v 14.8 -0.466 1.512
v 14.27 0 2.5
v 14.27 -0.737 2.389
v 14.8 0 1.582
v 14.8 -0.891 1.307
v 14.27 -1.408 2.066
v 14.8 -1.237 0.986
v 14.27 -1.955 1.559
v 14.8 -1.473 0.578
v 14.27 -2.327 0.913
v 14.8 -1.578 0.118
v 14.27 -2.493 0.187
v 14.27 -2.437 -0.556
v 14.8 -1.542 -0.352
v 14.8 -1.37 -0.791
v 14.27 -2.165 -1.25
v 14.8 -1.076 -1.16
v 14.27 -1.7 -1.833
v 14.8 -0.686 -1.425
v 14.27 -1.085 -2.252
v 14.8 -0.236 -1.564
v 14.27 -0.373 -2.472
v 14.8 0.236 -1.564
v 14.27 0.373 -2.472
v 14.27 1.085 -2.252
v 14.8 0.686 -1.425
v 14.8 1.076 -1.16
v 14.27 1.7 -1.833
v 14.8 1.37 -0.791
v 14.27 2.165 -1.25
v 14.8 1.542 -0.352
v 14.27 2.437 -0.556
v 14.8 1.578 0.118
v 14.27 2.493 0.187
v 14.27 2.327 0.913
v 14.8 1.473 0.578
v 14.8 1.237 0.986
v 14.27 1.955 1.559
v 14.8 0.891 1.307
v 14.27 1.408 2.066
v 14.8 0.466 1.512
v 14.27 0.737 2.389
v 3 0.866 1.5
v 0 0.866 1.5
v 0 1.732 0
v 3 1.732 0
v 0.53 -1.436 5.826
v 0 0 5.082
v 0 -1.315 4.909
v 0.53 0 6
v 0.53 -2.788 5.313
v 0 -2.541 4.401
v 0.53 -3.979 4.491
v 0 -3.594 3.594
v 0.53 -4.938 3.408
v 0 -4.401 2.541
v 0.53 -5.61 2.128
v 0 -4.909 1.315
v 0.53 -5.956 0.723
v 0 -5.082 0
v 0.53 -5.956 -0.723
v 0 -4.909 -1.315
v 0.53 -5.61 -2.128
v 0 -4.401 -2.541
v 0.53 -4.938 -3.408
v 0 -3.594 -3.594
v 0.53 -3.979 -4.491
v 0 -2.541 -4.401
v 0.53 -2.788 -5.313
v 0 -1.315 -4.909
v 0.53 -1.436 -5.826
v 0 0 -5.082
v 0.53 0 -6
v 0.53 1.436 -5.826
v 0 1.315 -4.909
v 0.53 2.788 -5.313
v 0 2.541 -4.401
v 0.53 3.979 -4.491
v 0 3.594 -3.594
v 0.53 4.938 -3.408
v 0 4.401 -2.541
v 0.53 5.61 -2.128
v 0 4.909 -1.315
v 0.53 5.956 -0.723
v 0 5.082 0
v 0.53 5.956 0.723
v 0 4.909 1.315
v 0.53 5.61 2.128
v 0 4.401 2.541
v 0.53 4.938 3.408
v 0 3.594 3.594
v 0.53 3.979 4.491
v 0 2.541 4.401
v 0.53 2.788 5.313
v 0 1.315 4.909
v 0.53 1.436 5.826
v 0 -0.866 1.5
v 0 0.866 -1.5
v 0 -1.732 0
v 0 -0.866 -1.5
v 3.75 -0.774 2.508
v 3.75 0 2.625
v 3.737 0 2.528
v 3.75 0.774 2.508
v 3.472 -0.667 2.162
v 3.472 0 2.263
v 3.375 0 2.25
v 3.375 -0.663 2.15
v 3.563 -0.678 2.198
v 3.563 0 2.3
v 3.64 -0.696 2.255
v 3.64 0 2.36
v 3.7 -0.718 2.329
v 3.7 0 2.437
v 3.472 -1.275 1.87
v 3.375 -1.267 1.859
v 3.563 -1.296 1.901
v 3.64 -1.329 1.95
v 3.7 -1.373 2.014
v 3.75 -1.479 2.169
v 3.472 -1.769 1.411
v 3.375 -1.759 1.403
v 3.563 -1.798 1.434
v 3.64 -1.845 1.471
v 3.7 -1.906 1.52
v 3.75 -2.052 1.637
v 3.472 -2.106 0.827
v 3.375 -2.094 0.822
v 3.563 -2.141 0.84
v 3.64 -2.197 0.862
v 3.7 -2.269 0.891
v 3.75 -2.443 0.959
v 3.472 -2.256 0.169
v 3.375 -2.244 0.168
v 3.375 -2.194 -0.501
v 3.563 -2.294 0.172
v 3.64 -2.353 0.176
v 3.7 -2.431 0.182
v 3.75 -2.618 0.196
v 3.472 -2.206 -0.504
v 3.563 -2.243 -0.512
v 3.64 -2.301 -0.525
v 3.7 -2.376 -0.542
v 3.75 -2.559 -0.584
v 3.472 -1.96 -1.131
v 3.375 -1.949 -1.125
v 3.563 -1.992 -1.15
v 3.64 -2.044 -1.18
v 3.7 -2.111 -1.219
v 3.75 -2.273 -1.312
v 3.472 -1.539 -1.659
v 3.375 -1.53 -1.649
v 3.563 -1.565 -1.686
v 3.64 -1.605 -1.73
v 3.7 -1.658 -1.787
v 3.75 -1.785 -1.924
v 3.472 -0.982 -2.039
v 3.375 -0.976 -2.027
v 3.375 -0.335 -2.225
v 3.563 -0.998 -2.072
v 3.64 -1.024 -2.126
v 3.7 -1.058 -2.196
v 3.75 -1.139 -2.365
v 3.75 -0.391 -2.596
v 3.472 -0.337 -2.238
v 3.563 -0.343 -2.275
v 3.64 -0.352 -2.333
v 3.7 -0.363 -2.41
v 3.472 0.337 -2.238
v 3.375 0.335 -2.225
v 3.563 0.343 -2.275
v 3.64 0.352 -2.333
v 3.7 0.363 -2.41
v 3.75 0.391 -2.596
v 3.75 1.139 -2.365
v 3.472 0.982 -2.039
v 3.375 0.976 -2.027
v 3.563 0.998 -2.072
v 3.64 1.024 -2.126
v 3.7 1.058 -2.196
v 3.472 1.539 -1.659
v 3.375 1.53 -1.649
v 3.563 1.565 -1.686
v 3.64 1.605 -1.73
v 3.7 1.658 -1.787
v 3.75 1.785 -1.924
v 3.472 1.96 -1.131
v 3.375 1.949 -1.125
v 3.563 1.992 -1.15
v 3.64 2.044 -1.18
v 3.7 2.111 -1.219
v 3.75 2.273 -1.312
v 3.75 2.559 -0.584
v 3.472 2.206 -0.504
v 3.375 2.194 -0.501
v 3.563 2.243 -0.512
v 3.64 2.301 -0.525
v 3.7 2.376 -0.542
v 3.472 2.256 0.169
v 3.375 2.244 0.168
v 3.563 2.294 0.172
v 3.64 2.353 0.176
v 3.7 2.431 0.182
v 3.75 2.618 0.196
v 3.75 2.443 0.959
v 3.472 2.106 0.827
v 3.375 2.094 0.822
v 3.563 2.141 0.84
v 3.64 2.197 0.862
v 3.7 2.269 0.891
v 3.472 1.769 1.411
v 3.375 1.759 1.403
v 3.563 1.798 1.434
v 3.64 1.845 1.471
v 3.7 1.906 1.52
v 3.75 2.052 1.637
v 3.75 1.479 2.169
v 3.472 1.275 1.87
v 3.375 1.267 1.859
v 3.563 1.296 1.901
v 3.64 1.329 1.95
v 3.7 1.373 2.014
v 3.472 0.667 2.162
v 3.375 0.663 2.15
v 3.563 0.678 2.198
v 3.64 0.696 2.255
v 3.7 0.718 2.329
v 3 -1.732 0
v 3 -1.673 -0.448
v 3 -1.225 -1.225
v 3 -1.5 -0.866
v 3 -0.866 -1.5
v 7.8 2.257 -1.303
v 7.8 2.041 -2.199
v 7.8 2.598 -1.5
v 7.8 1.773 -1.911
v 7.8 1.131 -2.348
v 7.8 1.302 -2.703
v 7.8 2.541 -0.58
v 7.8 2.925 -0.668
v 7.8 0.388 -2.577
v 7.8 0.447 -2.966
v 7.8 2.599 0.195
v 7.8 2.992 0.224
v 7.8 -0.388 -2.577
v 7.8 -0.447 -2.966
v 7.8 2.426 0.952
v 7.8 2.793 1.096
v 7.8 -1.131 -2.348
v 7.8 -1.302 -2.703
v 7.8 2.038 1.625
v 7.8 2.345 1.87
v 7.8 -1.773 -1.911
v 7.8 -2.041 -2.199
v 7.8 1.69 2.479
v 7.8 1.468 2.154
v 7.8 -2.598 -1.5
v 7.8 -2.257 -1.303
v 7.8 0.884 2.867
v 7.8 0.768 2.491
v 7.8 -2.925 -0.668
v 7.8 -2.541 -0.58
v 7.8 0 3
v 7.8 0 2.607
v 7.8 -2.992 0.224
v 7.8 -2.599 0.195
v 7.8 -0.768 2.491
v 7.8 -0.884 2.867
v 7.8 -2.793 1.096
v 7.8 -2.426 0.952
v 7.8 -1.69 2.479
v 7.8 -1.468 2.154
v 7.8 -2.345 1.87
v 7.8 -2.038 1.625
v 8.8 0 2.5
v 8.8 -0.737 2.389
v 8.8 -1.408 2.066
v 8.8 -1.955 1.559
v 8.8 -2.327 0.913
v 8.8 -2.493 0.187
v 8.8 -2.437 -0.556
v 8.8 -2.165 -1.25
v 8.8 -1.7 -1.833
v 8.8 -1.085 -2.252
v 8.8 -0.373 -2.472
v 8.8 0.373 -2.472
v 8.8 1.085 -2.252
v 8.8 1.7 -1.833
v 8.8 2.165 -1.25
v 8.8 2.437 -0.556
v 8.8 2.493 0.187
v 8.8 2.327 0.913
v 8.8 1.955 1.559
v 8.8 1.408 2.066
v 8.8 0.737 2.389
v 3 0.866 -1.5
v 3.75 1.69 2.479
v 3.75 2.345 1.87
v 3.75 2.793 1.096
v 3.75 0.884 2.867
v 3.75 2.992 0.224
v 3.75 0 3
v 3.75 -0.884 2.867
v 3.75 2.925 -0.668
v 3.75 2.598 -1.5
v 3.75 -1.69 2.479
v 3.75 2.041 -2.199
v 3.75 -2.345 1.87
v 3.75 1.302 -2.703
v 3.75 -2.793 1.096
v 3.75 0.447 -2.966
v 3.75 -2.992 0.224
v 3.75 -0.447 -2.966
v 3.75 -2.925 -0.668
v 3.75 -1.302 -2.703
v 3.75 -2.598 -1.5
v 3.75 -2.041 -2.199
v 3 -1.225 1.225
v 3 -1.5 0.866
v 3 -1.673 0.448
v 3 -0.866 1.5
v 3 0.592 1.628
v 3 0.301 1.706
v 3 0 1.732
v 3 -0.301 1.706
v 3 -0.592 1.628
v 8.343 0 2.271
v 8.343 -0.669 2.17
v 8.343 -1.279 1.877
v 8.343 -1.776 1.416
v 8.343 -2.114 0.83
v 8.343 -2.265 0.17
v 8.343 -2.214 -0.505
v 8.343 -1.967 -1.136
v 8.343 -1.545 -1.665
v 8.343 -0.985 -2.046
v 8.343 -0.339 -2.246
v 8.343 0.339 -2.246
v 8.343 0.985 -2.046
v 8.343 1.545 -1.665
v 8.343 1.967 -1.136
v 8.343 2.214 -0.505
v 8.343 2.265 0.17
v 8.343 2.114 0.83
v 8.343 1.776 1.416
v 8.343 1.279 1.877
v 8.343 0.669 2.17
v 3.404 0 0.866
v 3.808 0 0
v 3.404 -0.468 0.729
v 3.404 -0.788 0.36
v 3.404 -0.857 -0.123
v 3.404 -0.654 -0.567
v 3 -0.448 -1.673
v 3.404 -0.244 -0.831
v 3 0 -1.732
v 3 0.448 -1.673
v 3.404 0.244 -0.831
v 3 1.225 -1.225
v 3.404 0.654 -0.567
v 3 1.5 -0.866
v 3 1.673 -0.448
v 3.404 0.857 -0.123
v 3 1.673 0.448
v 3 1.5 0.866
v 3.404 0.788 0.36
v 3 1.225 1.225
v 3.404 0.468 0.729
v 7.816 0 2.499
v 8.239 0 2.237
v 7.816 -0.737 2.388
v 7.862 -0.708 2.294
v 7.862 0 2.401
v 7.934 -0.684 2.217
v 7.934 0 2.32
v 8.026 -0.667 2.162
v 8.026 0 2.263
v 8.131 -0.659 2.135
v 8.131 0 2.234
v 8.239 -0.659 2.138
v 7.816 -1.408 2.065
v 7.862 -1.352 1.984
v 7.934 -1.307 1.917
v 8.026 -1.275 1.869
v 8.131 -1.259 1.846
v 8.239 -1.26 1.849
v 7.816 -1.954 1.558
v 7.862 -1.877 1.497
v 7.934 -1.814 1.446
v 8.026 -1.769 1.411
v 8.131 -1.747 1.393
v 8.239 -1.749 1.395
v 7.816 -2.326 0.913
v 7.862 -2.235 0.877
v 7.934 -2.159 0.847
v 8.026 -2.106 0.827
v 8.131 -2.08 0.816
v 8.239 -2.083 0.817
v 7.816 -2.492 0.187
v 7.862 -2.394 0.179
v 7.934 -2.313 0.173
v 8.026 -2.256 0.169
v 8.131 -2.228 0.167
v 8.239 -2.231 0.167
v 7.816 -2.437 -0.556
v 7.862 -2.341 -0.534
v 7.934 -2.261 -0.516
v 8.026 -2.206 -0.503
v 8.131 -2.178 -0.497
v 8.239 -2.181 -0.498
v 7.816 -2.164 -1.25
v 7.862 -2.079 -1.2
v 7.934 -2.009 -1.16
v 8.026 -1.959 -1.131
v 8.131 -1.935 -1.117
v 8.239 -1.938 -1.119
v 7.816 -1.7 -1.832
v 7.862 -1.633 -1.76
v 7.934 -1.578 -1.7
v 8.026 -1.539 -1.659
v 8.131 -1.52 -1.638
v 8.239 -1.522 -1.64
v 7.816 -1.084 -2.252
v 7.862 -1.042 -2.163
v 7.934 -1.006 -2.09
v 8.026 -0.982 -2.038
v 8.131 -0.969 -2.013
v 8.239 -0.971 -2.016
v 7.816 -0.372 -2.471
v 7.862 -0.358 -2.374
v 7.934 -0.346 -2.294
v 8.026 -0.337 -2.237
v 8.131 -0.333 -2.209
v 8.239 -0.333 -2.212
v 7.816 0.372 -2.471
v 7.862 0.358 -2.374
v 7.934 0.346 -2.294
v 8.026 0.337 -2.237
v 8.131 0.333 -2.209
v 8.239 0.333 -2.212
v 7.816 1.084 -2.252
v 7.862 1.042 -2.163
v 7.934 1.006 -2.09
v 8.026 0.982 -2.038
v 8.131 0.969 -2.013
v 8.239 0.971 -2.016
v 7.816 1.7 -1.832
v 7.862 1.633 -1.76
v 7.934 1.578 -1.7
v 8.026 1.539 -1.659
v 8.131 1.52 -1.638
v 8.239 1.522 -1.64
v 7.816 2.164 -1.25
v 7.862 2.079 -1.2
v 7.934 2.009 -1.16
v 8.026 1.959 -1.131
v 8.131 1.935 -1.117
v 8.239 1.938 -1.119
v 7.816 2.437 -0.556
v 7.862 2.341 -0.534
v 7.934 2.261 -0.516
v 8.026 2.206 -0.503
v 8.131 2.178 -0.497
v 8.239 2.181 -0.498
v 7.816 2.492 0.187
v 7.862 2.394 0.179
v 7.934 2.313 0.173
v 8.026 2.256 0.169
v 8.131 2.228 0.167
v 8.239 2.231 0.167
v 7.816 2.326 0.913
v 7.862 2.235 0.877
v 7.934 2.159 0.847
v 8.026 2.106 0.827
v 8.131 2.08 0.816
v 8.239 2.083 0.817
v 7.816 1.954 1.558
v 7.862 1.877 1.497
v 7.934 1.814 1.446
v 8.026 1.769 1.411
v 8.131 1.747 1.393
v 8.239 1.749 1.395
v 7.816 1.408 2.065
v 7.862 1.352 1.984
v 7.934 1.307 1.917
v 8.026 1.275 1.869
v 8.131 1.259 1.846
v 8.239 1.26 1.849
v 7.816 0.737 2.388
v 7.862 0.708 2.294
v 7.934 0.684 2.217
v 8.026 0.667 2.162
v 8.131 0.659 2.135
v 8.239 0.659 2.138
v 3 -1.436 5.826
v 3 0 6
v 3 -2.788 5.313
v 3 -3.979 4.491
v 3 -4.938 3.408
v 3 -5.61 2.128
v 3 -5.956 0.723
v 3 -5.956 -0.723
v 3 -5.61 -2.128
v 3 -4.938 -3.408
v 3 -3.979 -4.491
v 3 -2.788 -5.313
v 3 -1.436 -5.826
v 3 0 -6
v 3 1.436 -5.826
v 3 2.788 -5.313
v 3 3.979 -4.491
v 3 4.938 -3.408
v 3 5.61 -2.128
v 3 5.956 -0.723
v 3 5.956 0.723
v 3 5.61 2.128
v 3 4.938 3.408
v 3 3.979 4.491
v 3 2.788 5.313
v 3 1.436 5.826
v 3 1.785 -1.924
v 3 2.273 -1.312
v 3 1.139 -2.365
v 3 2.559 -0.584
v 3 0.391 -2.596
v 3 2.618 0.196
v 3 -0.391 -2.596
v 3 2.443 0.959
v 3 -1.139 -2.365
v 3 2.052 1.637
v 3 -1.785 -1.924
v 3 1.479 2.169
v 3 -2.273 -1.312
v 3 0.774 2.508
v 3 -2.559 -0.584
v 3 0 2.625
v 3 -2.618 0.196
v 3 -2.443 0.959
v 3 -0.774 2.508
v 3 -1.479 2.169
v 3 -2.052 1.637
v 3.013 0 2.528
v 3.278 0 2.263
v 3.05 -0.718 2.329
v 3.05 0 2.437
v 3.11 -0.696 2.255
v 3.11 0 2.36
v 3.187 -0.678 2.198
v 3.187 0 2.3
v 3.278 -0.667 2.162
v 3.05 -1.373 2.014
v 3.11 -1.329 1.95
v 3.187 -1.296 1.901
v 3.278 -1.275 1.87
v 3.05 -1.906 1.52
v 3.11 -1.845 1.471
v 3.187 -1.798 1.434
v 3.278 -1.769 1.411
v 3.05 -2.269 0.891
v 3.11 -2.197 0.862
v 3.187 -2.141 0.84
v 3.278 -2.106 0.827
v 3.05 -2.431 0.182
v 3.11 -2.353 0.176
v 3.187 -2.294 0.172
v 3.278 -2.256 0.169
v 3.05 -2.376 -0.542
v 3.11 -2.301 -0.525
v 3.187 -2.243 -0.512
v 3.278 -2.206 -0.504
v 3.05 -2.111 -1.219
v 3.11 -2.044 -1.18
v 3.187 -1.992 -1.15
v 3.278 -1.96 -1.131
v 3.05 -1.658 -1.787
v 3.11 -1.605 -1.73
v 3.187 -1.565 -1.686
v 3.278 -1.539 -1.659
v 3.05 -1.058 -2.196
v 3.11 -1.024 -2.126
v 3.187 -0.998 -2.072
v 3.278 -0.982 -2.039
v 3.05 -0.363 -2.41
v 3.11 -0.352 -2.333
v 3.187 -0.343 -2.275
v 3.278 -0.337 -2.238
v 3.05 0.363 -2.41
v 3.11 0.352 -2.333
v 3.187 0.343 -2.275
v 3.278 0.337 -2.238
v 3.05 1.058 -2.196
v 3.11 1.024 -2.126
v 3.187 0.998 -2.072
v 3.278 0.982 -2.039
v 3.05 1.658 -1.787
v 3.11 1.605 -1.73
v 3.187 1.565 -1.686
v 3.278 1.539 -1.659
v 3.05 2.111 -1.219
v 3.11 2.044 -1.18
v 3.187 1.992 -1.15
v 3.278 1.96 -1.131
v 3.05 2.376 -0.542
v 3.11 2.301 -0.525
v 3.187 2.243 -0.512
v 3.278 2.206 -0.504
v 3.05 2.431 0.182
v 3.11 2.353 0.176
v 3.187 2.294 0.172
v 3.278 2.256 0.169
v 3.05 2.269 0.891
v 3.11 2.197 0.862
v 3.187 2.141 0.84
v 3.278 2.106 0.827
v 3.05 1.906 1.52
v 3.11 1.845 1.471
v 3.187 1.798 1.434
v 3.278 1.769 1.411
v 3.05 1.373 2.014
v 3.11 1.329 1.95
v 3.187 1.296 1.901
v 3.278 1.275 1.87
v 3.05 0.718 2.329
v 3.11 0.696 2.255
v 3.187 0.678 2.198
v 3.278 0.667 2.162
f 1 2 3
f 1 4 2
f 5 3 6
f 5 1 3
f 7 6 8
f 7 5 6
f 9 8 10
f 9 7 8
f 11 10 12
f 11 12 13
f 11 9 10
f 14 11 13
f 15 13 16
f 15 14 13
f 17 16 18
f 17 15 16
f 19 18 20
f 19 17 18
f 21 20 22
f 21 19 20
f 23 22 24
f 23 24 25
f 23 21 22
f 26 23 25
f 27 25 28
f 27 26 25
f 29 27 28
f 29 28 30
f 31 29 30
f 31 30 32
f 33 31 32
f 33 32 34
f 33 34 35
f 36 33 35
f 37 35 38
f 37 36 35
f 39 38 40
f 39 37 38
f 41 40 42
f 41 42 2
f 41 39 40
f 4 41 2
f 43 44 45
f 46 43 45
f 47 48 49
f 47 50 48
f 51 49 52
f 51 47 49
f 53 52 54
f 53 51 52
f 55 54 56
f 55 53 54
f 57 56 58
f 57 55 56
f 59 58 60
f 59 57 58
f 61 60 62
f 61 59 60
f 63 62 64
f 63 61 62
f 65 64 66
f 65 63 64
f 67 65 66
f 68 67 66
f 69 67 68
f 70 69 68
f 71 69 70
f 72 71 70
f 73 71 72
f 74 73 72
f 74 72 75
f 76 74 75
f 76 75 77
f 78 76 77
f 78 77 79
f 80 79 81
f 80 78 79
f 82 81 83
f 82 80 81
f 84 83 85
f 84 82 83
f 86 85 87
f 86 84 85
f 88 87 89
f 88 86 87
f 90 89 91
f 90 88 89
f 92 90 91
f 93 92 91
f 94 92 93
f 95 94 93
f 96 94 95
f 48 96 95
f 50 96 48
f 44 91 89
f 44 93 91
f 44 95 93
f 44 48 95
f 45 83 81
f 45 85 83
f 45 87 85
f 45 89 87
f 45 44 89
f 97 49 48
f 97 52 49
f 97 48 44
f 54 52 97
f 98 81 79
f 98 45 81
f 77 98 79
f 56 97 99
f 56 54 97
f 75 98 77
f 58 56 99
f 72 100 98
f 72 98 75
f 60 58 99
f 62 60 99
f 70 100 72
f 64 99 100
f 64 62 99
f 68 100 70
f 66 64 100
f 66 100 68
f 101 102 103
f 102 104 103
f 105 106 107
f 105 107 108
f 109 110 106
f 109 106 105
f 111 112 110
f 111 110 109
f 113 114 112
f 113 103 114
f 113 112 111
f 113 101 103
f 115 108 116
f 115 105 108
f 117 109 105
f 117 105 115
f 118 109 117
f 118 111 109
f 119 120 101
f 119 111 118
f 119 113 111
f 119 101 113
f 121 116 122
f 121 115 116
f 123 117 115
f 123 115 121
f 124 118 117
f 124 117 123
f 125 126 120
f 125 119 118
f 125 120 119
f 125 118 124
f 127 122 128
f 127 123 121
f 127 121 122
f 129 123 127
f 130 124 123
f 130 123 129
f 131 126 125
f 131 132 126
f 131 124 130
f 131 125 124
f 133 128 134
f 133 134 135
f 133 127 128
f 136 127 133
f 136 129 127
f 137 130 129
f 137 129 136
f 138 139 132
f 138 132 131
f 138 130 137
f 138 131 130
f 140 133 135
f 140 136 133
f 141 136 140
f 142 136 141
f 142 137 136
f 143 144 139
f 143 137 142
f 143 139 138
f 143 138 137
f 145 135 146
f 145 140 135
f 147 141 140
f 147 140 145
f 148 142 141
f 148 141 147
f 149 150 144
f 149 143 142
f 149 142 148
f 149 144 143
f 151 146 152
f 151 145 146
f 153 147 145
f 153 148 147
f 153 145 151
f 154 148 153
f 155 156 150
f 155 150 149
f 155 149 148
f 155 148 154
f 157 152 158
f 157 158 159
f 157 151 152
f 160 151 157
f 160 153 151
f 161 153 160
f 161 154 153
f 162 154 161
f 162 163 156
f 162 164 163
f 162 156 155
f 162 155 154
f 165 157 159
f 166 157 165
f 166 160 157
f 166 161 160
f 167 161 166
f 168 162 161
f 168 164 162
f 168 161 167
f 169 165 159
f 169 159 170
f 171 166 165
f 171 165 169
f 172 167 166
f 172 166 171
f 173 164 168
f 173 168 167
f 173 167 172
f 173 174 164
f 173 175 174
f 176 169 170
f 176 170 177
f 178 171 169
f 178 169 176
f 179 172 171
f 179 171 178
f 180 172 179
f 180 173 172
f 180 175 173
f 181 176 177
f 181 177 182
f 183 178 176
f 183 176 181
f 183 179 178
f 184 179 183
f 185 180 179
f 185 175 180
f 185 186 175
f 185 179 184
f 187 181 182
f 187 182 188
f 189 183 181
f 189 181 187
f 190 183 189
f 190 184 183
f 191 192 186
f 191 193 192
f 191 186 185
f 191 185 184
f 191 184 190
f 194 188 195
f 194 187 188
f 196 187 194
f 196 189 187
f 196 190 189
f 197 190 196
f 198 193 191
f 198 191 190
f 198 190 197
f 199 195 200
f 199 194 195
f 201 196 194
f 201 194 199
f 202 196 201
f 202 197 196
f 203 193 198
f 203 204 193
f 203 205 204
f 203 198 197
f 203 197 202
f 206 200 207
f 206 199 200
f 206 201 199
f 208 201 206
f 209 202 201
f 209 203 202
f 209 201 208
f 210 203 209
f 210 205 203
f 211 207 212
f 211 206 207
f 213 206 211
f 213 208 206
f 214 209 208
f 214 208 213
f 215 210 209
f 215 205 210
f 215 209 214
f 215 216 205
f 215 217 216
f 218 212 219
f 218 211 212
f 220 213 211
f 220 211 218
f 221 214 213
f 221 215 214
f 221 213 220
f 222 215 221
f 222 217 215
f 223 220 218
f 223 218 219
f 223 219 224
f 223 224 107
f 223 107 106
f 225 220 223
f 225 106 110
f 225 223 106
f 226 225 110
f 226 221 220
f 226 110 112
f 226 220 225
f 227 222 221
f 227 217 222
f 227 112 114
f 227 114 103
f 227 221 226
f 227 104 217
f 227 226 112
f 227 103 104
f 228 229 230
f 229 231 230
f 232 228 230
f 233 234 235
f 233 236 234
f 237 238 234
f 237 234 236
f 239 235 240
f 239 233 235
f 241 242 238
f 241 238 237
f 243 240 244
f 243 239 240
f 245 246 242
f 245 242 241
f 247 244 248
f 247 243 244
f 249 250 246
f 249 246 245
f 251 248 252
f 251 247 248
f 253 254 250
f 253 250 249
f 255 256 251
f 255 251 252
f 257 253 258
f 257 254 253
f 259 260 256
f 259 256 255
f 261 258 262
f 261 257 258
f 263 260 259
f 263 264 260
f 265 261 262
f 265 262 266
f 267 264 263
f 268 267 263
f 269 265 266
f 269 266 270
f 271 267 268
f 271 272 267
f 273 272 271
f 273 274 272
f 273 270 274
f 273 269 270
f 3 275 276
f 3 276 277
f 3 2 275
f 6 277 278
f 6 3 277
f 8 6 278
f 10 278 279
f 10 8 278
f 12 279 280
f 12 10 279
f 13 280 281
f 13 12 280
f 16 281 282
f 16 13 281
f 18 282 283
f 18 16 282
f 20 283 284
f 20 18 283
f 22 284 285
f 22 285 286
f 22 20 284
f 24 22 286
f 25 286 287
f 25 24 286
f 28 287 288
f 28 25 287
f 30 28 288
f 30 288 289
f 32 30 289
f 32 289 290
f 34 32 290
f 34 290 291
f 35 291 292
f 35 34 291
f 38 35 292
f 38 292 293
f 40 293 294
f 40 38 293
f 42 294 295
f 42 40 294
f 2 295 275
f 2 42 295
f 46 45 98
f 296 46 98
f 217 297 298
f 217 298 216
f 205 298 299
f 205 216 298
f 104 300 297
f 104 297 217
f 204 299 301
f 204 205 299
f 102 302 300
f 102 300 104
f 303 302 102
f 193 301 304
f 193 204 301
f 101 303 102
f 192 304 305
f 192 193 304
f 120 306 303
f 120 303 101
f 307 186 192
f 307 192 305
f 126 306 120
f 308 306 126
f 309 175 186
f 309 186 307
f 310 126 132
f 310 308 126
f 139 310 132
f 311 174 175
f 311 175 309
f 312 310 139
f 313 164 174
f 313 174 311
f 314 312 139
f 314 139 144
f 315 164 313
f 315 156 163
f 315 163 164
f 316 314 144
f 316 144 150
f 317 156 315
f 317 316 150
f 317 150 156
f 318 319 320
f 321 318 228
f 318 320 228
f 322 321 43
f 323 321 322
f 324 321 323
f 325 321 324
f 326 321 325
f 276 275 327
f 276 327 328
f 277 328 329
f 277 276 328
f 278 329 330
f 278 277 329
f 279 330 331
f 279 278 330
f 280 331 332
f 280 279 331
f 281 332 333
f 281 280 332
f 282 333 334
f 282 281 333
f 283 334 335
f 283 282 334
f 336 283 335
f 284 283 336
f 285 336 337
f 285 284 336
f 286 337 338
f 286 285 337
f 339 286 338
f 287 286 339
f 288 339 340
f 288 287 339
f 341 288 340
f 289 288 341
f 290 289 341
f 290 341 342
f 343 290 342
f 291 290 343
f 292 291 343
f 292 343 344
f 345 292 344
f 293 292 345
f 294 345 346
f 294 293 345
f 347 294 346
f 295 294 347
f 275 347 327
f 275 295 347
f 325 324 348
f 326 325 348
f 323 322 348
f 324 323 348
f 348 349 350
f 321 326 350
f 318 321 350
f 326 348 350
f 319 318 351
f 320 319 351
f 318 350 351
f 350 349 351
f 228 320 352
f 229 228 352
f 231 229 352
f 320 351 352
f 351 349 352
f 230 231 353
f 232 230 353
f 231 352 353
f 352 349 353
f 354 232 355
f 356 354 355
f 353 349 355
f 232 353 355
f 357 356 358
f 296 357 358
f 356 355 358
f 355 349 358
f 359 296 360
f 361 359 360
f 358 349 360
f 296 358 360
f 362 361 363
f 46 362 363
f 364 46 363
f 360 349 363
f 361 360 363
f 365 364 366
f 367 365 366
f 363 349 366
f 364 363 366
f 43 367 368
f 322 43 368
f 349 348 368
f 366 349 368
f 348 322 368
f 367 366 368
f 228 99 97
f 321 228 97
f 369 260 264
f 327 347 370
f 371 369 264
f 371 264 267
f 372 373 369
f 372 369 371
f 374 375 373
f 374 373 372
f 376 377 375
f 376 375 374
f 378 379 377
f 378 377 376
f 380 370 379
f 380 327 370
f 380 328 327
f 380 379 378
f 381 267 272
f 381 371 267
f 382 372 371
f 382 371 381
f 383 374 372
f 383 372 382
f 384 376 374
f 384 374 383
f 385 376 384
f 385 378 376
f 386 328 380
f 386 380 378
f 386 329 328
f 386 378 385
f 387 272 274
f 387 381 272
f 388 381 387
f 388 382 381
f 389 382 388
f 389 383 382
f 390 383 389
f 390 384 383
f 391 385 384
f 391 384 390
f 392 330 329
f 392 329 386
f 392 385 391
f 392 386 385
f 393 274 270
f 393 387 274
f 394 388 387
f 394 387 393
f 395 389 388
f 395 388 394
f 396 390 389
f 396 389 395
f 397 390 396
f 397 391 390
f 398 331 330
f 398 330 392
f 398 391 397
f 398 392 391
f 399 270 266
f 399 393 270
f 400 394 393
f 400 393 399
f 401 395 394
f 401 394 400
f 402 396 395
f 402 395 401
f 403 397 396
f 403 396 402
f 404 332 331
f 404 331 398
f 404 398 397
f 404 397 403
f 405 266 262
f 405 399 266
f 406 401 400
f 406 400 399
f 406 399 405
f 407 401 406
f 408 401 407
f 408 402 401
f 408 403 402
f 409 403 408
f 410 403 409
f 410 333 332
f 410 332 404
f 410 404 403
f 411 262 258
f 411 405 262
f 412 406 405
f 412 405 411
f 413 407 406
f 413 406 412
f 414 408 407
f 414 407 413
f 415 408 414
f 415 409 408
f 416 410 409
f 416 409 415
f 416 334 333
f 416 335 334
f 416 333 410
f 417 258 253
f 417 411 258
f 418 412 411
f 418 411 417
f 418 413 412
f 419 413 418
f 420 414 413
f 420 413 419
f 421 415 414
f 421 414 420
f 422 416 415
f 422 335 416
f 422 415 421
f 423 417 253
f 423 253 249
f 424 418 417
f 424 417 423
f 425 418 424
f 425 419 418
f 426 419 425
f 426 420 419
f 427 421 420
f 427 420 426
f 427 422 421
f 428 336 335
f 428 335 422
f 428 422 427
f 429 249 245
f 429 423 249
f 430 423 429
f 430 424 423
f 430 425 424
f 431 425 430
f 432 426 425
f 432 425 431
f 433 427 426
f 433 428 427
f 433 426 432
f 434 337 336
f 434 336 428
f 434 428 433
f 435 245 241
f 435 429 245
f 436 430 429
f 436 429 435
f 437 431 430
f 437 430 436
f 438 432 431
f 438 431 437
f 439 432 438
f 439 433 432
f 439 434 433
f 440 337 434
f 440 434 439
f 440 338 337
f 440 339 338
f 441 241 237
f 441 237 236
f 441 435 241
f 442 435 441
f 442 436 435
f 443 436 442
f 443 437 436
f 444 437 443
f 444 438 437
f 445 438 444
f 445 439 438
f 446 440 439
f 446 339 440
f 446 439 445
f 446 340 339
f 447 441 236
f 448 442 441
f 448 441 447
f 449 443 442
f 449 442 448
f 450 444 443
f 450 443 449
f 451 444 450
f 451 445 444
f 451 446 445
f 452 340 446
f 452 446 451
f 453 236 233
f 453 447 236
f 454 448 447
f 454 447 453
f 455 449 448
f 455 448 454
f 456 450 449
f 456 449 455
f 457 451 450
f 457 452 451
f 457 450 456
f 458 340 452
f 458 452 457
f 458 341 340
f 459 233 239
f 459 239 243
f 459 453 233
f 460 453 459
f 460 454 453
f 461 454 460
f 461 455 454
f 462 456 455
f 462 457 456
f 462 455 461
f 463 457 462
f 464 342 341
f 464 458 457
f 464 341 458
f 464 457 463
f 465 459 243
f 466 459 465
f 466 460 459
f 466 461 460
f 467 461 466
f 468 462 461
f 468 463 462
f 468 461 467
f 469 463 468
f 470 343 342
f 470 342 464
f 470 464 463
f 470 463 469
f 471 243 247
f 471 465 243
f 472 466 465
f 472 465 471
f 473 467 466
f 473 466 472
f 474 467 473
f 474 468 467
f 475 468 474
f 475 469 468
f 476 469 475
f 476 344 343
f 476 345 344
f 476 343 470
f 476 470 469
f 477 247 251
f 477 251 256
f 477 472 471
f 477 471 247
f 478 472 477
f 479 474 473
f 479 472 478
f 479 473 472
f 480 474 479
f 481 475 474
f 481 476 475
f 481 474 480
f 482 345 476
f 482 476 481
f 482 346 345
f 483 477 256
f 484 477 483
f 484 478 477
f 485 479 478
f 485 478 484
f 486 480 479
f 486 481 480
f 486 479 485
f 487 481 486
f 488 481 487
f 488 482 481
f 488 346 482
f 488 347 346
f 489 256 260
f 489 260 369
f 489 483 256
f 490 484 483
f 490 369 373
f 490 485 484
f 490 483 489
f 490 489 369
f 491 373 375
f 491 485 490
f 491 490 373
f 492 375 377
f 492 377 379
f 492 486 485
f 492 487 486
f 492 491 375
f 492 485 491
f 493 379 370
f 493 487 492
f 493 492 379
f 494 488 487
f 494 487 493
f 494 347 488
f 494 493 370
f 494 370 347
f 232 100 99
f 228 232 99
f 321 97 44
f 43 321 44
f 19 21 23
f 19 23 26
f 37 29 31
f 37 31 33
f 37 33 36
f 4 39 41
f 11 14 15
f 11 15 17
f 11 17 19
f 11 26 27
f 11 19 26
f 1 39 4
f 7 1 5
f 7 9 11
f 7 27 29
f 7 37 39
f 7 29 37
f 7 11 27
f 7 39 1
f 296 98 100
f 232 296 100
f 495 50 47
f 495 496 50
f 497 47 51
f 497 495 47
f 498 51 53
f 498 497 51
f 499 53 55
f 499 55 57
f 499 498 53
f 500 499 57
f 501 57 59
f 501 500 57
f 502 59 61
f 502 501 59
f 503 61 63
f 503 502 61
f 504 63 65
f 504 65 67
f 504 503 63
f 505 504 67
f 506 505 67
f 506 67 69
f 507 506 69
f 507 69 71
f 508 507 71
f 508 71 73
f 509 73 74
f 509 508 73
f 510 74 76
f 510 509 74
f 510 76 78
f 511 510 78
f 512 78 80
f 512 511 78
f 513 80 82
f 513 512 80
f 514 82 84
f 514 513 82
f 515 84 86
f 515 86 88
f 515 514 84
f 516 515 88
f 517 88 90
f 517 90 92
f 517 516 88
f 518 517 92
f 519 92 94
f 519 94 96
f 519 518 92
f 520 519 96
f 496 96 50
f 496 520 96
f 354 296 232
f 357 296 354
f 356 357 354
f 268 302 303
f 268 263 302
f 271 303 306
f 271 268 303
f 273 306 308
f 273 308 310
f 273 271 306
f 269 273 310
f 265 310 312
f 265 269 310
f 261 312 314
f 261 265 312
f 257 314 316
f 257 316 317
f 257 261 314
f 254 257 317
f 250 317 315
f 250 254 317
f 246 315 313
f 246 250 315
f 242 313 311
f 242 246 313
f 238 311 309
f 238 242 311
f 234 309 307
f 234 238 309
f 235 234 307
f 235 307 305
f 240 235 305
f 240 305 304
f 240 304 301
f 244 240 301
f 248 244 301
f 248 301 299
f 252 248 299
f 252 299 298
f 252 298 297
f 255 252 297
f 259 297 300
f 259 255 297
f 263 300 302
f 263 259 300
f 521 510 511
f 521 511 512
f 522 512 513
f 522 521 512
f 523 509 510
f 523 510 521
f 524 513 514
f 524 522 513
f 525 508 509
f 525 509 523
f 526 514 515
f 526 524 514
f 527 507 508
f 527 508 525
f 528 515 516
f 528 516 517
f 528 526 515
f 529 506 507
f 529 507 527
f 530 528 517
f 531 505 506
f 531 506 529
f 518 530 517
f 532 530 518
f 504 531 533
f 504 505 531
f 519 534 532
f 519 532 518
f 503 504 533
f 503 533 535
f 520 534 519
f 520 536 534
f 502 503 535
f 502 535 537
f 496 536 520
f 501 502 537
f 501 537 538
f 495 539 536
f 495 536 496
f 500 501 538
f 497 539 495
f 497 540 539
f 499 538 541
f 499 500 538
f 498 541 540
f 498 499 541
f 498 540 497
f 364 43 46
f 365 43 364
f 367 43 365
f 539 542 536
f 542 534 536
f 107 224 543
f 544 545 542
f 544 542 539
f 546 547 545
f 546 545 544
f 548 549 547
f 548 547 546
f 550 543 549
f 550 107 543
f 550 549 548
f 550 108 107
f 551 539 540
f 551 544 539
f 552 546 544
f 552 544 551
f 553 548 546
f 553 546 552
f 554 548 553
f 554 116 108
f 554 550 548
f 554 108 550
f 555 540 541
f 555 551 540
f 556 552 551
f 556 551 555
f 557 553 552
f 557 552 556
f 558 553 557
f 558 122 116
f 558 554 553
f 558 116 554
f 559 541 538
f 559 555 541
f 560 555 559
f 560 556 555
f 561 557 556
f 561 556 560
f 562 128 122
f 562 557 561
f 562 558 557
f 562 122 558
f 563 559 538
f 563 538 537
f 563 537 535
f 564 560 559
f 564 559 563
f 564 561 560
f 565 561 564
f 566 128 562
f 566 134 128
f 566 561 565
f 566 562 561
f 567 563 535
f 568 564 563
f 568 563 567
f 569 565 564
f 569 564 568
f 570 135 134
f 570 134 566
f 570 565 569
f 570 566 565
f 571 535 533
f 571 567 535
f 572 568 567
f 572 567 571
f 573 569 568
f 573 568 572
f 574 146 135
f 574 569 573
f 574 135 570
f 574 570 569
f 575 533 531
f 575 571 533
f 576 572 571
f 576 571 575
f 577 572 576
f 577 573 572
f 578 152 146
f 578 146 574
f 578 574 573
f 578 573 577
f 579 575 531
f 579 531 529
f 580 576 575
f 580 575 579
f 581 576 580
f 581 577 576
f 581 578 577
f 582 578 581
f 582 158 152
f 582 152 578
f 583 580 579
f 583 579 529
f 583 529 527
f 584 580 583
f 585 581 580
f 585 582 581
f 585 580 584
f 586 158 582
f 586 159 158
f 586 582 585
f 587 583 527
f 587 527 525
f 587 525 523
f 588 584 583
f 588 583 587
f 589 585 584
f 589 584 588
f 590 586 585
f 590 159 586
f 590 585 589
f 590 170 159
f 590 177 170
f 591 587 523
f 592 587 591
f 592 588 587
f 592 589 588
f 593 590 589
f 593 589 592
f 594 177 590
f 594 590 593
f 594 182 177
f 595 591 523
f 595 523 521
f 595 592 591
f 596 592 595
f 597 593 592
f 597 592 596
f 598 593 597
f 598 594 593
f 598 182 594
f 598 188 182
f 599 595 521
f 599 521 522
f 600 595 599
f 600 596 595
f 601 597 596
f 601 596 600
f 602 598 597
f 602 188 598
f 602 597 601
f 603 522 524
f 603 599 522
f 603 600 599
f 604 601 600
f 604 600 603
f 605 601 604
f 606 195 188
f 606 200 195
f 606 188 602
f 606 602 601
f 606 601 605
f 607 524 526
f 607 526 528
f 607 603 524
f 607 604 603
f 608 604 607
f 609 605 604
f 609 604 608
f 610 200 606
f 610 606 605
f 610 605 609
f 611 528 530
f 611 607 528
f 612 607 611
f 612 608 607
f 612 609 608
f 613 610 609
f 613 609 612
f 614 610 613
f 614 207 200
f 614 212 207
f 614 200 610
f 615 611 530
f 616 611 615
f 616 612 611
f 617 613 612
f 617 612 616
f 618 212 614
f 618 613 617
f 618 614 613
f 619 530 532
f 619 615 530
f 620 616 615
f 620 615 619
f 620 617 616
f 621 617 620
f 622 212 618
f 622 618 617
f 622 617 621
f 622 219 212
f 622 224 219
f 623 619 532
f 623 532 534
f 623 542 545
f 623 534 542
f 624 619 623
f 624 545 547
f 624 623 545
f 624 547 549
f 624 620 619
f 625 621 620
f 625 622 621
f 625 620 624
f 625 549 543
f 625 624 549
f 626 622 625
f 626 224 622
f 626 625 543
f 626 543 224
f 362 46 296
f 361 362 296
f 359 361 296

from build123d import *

# Parameters (mm, degrees)
WYTNIJ_WYCI_GNI_CIE1_DEPTH = 3
ZAOKR_GLENIE2_R            = 0.375


with BuildPart() as part:
    # Szkic1 → Obrót1 (revolve)
    with BuildSketch(Plane.XY, mode=Mode.PRIVATE) as obr_t1_sk:
        Polygon((0, 0), (0, 5.082013072), (0.53, 6), (3, 6), (3, 2.25), (3.75, 2.25), (3.75, 3), (7.8, 3), (7.8, 2), (8.8, 2.5), (14.27, 2.5), (14.8, 1.582013072), (14.8, 0), align=None)
    revolve(obr_t1_sk.sketch.rotate(Axis((0, 0, 0), (1, 0, 0)), 90), axis=Axis((0, 0, 0), (1, 0, 0)))

    # Szkic2 → Wytnij-wyciągnięcie1 (cut)
    with BuildSketch(Plane.ZY):
        Polygon((0, -1.732050808), (1.5, -0.866025404), (1.5, 0.866025404), (0, 1.732050808), (-1.5, 0.866025404), (-1.5, -0.866025404), align=None)
    extrude(amount=-WYTNIJ_WYCI_GNI_CIE1_DEPTH, mode=Mode.SUBTRACT)

    # Szkic3 → Wycięcie-obrót1 (revolve, cut)
    with BuildSketch(Plane.XY, mode=Mode.PRIVATE) as wyci_cie_obr_t1_sk:
        Polygon((3, 0), (3, 1.732050808), (3.807668556, 0), align=None)
    revolve(wyci_cie_obr_t1_sk.sketch.rotate(Axis((-0.90277096, 0, 0), (1, 0, 0)), 90), axis=Axis((-0.90277096, 0, 0), (1, 0, 0)), mode=Mode.SUBTRACT)

    # Zaokrąglenie2
    zaokr_glenie2_edges = [part.edges().sort_by_distance(p)[0] for p in [
        (7.8, 0, -2),
        (3.75, 0, -2.25),
        (3, 0, -2.25),
    ]]
    fillet(zaokr_glenie2_edges, radius=ZAOKR_GLENIE2_R - 0.0001)  # a hair under: the kernel refuses the full size


solid = part.part
